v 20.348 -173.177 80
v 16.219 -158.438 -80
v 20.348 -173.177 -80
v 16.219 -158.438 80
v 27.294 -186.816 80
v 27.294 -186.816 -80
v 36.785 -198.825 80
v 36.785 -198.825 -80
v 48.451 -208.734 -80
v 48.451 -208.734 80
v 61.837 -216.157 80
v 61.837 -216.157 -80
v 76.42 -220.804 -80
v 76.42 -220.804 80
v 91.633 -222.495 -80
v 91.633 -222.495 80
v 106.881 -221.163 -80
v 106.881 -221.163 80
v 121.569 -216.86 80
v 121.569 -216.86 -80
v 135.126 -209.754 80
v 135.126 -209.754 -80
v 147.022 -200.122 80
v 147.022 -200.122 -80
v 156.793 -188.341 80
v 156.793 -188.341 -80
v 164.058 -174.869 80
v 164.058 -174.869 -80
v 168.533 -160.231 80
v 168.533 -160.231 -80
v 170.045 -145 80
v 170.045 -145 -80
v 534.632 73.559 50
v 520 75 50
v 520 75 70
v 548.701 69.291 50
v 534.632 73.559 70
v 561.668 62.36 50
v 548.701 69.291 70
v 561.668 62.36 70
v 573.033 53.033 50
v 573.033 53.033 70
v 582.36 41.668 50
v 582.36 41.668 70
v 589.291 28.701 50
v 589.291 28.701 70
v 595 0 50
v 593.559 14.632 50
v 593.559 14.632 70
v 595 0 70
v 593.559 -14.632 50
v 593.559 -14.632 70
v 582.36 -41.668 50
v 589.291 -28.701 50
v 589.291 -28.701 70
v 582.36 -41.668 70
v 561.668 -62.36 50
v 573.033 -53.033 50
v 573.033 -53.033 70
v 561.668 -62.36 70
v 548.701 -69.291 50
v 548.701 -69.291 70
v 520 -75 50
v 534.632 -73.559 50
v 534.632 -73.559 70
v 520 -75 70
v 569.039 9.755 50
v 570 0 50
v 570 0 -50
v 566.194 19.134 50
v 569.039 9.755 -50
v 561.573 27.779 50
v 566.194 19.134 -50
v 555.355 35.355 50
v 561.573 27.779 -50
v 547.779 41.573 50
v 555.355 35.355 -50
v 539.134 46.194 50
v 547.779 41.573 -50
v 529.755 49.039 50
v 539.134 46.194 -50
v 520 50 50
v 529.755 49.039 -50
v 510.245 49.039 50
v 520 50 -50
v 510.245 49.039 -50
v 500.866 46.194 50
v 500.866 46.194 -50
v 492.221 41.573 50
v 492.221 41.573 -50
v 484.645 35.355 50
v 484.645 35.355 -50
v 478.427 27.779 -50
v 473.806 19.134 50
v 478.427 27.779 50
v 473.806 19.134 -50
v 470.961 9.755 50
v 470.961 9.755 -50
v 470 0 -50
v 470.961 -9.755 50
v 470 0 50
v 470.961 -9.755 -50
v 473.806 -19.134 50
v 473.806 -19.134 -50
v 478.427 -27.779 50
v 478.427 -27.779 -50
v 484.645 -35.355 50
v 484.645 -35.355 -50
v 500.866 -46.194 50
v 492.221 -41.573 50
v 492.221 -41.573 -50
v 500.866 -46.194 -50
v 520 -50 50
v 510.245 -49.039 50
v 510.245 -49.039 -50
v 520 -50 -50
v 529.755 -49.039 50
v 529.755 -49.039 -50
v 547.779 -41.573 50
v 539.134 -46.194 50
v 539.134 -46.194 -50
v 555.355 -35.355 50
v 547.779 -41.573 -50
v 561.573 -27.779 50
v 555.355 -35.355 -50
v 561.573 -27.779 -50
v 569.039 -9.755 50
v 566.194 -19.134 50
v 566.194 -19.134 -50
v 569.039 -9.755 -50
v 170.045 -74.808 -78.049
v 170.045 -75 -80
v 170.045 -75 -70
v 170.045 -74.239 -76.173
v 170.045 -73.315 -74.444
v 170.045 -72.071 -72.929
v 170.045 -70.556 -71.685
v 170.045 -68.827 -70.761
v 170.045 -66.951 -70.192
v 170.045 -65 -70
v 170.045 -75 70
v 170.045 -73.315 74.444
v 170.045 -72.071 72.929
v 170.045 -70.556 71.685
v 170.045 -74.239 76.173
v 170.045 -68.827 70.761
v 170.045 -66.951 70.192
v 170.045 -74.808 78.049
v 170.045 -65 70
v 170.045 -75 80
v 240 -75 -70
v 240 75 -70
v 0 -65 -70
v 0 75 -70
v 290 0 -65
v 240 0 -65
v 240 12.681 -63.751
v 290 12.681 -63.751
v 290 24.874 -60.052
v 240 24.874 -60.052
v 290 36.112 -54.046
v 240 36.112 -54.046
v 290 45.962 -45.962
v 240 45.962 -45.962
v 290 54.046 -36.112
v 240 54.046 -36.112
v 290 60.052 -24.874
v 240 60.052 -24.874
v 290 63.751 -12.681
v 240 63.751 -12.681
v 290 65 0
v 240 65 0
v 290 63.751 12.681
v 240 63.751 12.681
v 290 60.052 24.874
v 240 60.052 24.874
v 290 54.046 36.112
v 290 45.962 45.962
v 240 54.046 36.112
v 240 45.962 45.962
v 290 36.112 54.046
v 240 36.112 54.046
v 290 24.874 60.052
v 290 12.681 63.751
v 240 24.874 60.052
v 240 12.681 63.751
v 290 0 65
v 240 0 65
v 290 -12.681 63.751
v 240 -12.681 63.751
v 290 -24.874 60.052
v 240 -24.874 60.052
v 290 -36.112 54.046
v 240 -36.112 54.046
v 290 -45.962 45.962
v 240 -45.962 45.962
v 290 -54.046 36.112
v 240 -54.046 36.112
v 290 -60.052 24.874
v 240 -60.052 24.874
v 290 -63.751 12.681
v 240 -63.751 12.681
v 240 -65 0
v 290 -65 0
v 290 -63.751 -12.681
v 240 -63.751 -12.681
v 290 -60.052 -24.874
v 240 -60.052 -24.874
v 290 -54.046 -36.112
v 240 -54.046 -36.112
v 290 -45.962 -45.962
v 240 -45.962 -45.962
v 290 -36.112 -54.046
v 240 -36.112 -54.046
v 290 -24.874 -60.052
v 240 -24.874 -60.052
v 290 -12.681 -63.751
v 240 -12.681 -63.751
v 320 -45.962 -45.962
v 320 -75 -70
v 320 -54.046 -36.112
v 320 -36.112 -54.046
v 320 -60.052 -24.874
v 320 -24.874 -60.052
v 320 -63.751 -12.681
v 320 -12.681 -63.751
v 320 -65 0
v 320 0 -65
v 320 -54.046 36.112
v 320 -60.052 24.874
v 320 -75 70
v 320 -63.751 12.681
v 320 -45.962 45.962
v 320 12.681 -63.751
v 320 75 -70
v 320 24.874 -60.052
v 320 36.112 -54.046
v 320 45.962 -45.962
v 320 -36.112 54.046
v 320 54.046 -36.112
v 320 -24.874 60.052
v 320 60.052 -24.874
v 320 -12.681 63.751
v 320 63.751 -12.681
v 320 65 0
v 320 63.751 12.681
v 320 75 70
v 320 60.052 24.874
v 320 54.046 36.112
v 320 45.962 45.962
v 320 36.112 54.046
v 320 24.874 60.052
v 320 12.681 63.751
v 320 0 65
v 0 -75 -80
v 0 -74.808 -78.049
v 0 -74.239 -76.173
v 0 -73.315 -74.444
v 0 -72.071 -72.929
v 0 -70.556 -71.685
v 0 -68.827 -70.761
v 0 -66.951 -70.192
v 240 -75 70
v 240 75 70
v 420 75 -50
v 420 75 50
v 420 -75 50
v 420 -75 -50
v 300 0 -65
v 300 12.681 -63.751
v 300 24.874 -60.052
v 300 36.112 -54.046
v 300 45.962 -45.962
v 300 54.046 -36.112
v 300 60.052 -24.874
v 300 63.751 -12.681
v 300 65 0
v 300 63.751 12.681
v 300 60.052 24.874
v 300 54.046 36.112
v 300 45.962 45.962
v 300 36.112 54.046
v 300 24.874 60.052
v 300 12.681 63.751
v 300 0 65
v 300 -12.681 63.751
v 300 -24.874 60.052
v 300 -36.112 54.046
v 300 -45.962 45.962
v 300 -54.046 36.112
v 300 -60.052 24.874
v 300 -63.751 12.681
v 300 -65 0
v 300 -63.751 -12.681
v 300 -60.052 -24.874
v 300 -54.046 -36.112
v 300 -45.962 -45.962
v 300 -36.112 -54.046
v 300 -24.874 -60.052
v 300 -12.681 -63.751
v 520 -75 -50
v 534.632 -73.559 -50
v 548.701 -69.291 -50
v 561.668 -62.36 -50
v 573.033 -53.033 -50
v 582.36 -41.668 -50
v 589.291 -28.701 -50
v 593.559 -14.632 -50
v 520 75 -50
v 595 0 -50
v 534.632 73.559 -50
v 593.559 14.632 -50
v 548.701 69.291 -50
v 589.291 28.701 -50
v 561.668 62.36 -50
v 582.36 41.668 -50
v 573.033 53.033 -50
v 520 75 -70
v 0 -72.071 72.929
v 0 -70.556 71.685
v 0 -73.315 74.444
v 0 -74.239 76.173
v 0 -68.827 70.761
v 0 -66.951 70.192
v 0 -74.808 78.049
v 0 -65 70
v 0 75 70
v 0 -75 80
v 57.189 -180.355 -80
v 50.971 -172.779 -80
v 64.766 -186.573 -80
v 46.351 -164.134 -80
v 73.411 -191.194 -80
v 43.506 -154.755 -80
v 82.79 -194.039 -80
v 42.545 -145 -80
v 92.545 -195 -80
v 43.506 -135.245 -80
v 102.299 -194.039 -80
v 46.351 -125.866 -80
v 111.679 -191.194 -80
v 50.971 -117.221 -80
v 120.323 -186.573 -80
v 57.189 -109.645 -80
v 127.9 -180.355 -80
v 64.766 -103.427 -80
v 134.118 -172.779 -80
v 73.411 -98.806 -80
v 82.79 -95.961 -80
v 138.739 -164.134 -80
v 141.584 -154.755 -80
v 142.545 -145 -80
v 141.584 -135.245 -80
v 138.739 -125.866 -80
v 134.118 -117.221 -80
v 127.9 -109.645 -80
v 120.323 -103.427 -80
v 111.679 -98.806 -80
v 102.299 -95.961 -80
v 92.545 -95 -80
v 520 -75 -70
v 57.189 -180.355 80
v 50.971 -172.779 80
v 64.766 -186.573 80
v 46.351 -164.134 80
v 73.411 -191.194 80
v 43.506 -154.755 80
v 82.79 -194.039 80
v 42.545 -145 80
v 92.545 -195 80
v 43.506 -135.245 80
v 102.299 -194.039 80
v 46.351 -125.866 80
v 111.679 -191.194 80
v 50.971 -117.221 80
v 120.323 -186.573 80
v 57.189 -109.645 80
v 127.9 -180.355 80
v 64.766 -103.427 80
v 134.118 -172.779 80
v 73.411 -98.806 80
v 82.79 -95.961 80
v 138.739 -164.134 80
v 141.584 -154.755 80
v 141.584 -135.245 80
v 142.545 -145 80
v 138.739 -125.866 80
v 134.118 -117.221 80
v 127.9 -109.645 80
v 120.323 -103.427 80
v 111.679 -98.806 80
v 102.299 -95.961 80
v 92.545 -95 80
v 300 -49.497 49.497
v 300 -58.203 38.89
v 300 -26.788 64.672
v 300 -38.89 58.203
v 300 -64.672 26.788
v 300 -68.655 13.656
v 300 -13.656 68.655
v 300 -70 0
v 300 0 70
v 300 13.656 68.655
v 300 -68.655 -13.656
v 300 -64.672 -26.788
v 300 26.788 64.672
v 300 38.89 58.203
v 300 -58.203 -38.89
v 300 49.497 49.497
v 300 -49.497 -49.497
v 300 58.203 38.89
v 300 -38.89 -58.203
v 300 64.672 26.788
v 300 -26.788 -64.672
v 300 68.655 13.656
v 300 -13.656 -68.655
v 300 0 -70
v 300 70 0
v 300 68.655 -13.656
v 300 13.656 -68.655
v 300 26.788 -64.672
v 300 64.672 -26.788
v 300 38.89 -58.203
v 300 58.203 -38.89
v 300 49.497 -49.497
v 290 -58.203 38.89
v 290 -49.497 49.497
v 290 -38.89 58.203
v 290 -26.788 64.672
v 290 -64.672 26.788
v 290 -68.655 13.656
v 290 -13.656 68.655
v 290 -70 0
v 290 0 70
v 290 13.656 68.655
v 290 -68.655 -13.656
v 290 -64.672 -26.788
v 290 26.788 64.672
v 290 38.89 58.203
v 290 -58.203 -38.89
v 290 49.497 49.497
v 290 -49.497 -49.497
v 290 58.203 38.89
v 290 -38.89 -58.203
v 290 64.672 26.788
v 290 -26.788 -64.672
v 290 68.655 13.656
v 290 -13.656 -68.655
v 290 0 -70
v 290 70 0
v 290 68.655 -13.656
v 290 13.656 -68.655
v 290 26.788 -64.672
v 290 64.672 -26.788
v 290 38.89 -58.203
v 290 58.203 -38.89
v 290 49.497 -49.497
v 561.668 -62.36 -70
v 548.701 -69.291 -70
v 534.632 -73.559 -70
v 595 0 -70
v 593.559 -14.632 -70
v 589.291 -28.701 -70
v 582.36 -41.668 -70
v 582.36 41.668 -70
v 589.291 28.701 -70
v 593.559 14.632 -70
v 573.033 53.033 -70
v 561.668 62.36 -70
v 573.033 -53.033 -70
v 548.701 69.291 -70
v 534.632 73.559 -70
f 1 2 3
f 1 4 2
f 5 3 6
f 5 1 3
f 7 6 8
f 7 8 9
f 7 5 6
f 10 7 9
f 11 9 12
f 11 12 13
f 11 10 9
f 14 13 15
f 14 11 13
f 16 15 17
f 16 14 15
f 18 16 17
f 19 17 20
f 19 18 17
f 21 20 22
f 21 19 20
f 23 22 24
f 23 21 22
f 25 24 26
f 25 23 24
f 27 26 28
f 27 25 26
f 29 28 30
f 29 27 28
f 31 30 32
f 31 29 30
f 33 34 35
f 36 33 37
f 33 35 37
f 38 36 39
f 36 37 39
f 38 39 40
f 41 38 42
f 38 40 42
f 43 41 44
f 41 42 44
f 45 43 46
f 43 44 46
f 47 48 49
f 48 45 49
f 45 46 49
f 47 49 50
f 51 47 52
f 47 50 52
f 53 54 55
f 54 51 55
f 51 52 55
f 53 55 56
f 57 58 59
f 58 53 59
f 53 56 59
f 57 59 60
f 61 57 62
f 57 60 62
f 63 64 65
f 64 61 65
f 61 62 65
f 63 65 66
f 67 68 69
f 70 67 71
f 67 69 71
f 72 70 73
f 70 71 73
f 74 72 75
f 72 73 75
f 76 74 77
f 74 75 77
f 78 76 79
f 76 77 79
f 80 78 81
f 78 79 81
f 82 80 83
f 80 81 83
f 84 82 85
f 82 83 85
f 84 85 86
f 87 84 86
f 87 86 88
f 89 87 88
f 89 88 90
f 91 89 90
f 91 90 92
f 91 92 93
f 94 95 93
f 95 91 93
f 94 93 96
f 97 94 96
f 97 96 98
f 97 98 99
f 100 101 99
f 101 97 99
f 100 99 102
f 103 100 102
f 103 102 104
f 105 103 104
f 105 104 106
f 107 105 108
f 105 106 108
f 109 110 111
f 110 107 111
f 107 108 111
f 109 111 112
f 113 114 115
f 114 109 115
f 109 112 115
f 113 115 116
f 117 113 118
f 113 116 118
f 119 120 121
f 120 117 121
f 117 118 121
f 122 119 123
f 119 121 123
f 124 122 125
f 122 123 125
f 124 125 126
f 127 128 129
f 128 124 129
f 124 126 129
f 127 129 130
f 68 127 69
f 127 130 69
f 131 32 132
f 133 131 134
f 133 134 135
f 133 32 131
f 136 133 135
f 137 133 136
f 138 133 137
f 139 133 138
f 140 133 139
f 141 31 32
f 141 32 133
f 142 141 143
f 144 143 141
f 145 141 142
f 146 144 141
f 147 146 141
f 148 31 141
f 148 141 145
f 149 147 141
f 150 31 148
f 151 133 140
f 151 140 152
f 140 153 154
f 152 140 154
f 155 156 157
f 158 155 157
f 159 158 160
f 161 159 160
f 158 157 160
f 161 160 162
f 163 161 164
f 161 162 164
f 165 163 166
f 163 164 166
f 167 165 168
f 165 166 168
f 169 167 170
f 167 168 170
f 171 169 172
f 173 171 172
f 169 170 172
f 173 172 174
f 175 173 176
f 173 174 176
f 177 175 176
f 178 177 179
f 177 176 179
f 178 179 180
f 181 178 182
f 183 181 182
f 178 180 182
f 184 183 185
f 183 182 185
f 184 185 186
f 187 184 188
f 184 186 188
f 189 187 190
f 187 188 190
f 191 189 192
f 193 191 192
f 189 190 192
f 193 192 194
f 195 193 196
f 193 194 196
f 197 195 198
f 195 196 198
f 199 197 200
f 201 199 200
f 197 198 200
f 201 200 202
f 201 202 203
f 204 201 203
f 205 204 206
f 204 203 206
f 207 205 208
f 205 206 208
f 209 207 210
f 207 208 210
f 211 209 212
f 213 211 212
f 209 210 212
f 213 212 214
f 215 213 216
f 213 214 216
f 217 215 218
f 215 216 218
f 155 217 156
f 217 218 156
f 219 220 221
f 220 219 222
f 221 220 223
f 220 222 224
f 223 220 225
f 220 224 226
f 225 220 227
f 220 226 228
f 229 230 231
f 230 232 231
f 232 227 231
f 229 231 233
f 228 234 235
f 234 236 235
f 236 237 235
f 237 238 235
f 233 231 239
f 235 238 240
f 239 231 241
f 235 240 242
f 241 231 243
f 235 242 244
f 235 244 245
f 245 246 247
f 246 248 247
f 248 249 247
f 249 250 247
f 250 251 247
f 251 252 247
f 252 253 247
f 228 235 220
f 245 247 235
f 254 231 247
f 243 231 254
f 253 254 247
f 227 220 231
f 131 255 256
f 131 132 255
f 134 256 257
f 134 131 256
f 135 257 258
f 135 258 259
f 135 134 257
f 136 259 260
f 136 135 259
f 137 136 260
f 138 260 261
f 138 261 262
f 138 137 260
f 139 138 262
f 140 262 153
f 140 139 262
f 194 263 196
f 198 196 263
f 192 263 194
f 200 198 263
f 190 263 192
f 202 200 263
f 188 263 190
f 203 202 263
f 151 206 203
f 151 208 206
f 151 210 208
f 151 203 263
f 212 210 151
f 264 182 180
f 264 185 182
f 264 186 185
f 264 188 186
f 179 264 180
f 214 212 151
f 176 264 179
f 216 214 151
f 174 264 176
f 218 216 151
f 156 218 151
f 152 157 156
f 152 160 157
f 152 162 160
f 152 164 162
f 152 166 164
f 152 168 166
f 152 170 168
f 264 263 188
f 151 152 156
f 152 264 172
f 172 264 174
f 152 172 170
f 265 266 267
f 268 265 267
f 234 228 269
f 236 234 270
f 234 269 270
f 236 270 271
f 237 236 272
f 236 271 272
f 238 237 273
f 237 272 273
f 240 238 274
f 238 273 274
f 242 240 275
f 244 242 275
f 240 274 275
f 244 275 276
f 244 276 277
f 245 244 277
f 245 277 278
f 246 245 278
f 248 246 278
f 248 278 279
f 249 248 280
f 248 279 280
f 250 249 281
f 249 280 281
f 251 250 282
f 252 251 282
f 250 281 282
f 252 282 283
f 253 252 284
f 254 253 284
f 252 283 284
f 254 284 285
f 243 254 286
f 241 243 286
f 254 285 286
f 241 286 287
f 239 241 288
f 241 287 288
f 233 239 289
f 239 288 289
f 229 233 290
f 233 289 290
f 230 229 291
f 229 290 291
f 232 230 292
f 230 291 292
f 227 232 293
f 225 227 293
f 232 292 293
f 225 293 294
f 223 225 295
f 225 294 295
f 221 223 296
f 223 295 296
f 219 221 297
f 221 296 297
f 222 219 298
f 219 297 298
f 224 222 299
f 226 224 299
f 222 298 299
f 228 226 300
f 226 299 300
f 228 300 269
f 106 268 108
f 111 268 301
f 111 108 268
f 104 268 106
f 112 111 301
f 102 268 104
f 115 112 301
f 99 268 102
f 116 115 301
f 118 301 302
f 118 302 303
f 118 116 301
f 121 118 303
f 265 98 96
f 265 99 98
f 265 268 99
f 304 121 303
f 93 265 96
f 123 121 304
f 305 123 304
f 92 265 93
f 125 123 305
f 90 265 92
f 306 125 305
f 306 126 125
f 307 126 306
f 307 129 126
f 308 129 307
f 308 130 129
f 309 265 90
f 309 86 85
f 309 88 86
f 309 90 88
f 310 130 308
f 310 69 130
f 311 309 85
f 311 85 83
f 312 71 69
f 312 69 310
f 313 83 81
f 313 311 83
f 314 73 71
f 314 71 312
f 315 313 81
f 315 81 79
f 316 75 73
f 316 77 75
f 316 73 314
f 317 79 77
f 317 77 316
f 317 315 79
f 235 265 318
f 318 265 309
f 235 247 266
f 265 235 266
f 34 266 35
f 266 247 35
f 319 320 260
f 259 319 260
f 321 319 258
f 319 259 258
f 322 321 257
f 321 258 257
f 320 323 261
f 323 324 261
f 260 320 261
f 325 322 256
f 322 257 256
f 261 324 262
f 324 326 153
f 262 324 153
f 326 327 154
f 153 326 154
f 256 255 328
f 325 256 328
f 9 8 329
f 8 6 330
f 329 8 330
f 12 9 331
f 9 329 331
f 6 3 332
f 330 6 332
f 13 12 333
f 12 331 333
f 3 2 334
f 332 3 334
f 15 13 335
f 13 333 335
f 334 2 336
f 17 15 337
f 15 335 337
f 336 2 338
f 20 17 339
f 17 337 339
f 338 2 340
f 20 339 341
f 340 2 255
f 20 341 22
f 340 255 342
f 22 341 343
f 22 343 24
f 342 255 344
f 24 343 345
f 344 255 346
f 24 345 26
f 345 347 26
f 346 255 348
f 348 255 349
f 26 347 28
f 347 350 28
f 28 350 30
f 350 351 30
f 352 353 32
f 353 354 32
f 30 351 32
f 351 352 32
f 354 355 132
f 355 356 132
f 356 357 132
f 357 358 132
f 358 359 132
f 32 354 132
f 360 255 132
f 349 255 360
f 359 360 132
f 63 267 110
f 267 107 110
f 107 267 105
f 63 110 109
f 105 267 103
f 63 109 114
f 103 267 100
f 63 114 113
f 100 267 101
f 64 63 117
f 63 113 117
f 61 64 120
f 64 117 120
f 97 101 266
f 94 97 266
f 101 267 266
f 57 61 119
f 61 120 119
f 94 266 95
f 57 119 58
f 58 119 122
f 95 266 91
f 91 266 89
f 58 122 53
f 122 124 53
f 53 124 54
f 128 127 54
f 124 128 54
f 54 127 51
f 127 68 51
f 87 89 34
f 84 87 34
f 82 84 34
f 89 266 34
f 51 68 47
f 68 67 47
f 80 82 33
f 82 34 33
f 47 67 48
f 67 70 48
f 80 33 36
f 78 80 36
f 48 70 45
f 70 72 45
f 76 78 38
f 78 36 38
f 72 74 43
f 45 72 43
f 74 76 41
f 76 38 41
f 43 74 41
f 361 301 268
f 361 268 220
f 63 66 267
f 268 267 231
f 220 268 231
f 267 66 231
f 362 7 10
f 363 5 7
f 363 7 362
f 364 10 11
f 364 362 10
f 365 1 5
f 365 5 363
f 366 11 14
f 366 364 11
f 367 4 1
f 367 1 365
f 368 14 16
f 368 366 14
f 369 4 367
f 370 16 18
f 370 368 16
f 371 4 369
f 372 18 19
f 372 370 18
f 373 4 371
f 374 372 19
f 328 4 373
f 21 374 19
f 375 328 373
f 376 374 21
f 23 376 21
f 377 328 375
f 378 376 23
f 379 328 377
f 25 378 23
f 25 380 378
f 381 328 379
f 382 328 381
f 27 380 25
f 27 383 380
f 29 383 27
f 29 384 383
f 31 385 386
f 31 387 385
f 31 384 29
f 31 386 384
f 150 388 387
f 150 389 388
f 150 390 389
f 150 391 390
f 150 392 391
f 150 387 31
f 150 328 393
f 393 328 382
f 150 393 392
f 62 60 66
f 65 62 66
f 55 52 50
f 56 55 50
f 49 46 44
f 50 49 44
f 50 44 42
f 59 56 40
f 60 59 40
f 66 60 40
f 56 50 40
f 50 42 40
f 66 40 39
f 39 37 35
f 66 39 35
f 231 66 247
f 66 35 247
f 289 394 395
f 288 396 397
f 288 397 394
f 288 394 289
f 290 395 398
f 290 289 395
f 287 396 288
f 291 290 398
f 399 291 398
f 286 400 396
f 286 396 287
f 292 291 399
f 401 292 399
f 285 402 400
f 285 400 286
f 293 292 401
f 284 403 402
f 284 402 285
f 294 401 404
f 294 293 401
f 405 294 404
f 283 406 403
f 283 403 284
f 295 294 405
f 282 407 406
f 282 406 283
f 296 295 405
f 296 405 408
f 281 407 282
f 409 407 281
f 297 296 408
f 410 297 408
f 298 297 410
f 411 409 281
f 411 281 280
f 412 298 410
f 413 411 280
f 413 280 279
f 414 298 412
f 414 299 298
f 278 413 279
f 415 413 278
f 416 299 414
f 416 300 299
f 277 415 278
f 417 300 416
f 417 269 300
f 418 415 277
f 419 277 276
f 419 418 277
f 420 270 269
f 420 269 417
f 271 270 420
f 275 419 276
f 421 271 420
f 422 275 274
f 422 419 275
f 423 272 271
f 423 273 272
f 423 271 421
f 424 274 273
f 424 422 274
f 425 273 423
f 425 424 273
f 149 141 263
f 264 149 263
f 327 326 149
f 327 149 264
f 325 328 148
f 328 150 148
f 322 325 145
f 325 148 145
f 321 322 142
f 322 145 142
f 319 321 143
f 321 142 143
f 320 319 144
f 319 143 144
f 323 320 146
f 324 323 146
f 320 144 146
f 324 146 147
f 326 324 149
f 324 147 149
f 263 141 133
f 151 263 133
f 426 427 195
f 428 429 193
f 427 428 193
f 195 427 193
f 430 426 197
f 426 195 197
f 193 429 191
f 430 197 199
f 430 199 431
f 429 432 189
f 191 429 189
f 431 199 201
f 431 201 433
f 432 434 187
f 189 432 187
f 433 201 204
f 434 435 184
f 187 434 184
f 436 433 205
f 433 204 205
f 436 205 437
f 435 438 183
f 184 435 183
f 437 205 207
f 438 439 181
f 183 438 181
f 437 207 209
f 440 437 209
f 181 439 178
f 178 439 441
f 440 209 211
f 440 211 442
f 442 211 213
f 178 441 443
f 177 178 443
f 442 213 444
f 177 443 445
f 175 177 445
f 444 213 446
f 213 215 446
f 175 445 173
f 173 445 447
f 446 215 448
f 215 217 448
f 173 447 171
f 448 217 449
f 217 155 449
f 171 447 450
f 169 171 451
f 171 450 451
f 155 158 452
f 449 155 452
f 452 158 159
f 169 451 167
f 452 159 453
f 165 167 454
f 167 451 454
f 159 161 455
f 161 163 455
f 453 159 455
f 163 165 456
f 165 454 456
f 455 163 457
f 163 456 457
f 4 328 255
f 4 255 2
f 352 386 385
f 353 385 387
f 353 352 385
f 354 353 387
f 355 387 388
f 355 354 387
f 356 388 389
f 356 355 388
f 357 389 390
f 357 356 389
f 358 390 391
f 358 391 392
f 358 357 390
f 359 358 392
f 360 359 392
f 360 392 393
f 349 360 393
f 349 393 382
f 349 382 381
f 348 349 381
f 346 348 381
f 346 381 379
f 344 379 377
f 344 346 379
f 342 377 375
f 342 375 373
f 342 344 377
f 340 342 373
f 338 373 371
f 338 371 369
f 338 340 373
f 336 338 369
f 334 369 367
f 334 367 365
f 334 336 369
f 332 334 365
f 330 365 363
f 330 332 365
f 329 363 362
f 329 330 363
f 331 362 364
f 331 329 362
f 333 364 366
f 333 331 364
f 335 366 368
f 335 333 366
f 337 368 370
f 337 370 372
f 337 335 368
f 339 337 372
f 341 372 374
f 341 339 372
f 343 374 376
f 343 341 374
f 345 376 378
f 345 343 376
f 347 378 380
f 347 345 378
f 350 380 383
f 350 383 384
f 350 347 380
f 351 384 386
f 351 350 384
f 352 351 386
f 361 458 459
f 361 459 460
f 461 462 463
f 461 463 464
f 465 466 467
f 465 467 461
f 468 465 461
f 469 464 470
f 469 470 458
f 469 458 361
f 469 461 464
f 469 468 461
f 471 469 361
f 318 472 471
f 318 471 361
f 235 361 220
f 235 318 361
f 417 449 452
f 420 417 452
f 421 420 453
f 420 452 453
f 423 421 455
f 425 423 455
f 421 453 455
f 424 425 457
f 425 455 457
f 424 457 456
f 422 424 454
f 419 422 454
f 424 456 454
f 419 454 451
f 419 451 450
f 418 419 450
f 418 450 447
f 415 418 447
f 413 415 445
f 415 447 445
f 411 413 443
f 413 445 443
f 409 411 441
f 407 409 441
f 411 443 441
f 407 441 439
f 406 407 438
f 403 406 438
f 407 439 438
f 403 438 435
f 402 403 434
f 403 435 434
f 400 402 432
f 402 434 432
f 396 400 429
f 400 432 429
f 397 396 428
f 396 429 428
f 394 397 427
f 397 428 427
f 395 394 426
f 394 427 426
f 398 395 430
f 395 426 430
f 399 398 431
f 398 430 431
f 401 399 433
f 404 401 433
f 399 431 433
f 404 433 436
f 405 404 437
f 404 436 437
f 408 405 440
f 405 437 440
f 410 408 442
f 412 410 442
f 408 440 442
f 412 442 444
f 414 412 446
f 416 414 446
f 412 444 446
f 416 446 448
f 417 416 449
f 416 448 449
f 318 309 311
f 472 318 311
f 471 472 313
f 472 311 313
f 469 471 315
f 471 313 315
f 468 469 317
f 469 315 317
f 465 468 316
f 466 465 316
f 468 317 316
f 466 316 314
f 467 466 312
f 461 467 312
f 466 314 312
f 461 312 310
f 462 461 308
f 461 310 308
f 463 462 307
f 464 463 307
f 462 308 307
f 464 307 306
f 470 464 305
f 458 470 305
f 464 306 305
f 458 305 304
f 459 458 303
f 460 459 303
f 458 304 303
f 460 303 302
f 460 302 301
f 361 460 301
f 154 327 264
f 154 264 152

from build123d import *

# Parameters (mm, degrees)
SKETCH2_W           = 140
SKETCH2_H           = 150
BOSS_EXTRUDE1_DEPTH = 240
SKETCH3_R           = 65
BOSS_EXTRUDE2_DEPTH = 50
SKETCH4_R           = 70
BOSS_EXTRUDE3_DEPTH = 10
SKETCH5_R           = 50
BOSS_EXTRUDE4_DEPTH = 80
FILLET1_R           = 10
SKETCH6_R           = 65
BOSS_EXTRUDE5_DEPTH = 20
BOSS_EXTRUDE6_DEPTH = 70
CUT_EXTRUDE1_DEPTH  = 50
BOSS_EXTRUDE7_REACH = 650.407
SKETCH9_R           = 50


with BuildPart() as part:
    # Sketch2 → Boss-Extrude1 (new body)
    with BuildSketch(Plane(origin=(0, 0, 0), x_dir=(0, 0, -1), z_dir=(1, 0, 0))):
        Rectangle(SKETCH2_W, SKETCH2_H)
    extrude(amount=BOSS_EXTRUDE1_DEPTH)

    # Sketch3 → Boss-Extrude2 (add)
    with BuildSketch(Plane(origin=(240, 0, 0), x_dir=(0, 0, -1), z_dir=(1, 0, 0))):
        Circle(SKETCH3_R)
    extrude(amount=BOSS_EXTRUDE2_DEPTH)

    # Sketch4 → Boss-Extrude3 (add)
    with BuildSketch(Plane(origin=(290, 0, 0), x_dir=(0, 0, -1), z_dir=(1, 0, 0))):
        Circle(SKETCH4_R)
    extrude(amount=BOSS_EXTRUDE3_DEPTH)

    # Sketch5 → Boss-Extrude4 (add, symmetric)
    with BuildSketch(Plane.XY):
        with BuildLine():
            Line((170.044787747, -145), (170.044787747, -75))
            Line((170.044787747, -75), (0, -75))
            Line((0, -75), (16.218764607, -158.438310593))
            ThreePointArc((16.218764607, -158.438310593), (99.289534096, -222.205947936), (170.044787747, -145))
        make_face()
        with Locations((92.544787747, -145)):
            Circle(SKETCH5_R, mode=Mode.SUBTRACT)
    extrude(amount=BOSS_EXTRUDE4_DEPTH, both=True)

    # Fillet1
    fillet1_edges = [part.edges().sort_by_distance(p)[0] for p in [
        (85.022393874, -75, -70),
        (85.022393874, -75, 70),
    ]]
    fillet(fillet1_edges, radius=FILLET1_R - 0.0001)  # a hair under: the kernel refuses the full size

    # Sketch6 → Boss-Extrude5 (add)
    with BuildSketch(Plane(origin=(300, 0, 0), x_dir=(0, 0, -1), z_dir=(1, 0, 0))):
        Circle(SKETCH6_R)
    extrude(amount=BOSS_EXTRUDE5_DEPTH)

    # Sketch7 → Boss-Extrude6 (add, symmetric)
    with BuildSketch(Plane.XY):
        with BuildLine():
            Line((520, -75), (320, -75))
            Line((320, -75), (320, 75))
            Line((320, 75), (520, 75))
            ThreePointArc((520, 75), (595, 0), (520, -75))
        make_face()
    extrude(amount=BOSS_EXTRUDE6_DEPTH, both=True)

    # Sketch8 → Cut-Extrude1 (cut, symmetric)
    with BuildSketch(Plane.XY):
        with BuildLine():
            Line((520, 75), (420, 75))
            Line((420, 75), (420, -75))
            Line((420, -75), (520, -75))
            ThreePointArc((520, -75), (595, 0), (520, 75))
        make_face()
    extrude(amount=CUT_EXTRUDE1_DEPTH, both=True, mode=Mode.SUBTRACT)

    # Sketch9 → Boss-Extrude7 (add, up to next)
    with BuildSketch(Plane.XY.offset(-50), mode=Mode.PRIVATE) as boss_extrude7_sk1:
        with Locations((520, 0)):
            Circle(SKETCH9_R)
    boss_extrude7_tool1 = extrude(boss_extrude7_sk1.sketch, amount=BOSS_EXTRUDE7_REACH, mode=Mode.PRIVATE) - part.part
    add(boss_extrude7_tool1.solids().sort_by_distance((520, 0, -50))[0])


solid = part.part
